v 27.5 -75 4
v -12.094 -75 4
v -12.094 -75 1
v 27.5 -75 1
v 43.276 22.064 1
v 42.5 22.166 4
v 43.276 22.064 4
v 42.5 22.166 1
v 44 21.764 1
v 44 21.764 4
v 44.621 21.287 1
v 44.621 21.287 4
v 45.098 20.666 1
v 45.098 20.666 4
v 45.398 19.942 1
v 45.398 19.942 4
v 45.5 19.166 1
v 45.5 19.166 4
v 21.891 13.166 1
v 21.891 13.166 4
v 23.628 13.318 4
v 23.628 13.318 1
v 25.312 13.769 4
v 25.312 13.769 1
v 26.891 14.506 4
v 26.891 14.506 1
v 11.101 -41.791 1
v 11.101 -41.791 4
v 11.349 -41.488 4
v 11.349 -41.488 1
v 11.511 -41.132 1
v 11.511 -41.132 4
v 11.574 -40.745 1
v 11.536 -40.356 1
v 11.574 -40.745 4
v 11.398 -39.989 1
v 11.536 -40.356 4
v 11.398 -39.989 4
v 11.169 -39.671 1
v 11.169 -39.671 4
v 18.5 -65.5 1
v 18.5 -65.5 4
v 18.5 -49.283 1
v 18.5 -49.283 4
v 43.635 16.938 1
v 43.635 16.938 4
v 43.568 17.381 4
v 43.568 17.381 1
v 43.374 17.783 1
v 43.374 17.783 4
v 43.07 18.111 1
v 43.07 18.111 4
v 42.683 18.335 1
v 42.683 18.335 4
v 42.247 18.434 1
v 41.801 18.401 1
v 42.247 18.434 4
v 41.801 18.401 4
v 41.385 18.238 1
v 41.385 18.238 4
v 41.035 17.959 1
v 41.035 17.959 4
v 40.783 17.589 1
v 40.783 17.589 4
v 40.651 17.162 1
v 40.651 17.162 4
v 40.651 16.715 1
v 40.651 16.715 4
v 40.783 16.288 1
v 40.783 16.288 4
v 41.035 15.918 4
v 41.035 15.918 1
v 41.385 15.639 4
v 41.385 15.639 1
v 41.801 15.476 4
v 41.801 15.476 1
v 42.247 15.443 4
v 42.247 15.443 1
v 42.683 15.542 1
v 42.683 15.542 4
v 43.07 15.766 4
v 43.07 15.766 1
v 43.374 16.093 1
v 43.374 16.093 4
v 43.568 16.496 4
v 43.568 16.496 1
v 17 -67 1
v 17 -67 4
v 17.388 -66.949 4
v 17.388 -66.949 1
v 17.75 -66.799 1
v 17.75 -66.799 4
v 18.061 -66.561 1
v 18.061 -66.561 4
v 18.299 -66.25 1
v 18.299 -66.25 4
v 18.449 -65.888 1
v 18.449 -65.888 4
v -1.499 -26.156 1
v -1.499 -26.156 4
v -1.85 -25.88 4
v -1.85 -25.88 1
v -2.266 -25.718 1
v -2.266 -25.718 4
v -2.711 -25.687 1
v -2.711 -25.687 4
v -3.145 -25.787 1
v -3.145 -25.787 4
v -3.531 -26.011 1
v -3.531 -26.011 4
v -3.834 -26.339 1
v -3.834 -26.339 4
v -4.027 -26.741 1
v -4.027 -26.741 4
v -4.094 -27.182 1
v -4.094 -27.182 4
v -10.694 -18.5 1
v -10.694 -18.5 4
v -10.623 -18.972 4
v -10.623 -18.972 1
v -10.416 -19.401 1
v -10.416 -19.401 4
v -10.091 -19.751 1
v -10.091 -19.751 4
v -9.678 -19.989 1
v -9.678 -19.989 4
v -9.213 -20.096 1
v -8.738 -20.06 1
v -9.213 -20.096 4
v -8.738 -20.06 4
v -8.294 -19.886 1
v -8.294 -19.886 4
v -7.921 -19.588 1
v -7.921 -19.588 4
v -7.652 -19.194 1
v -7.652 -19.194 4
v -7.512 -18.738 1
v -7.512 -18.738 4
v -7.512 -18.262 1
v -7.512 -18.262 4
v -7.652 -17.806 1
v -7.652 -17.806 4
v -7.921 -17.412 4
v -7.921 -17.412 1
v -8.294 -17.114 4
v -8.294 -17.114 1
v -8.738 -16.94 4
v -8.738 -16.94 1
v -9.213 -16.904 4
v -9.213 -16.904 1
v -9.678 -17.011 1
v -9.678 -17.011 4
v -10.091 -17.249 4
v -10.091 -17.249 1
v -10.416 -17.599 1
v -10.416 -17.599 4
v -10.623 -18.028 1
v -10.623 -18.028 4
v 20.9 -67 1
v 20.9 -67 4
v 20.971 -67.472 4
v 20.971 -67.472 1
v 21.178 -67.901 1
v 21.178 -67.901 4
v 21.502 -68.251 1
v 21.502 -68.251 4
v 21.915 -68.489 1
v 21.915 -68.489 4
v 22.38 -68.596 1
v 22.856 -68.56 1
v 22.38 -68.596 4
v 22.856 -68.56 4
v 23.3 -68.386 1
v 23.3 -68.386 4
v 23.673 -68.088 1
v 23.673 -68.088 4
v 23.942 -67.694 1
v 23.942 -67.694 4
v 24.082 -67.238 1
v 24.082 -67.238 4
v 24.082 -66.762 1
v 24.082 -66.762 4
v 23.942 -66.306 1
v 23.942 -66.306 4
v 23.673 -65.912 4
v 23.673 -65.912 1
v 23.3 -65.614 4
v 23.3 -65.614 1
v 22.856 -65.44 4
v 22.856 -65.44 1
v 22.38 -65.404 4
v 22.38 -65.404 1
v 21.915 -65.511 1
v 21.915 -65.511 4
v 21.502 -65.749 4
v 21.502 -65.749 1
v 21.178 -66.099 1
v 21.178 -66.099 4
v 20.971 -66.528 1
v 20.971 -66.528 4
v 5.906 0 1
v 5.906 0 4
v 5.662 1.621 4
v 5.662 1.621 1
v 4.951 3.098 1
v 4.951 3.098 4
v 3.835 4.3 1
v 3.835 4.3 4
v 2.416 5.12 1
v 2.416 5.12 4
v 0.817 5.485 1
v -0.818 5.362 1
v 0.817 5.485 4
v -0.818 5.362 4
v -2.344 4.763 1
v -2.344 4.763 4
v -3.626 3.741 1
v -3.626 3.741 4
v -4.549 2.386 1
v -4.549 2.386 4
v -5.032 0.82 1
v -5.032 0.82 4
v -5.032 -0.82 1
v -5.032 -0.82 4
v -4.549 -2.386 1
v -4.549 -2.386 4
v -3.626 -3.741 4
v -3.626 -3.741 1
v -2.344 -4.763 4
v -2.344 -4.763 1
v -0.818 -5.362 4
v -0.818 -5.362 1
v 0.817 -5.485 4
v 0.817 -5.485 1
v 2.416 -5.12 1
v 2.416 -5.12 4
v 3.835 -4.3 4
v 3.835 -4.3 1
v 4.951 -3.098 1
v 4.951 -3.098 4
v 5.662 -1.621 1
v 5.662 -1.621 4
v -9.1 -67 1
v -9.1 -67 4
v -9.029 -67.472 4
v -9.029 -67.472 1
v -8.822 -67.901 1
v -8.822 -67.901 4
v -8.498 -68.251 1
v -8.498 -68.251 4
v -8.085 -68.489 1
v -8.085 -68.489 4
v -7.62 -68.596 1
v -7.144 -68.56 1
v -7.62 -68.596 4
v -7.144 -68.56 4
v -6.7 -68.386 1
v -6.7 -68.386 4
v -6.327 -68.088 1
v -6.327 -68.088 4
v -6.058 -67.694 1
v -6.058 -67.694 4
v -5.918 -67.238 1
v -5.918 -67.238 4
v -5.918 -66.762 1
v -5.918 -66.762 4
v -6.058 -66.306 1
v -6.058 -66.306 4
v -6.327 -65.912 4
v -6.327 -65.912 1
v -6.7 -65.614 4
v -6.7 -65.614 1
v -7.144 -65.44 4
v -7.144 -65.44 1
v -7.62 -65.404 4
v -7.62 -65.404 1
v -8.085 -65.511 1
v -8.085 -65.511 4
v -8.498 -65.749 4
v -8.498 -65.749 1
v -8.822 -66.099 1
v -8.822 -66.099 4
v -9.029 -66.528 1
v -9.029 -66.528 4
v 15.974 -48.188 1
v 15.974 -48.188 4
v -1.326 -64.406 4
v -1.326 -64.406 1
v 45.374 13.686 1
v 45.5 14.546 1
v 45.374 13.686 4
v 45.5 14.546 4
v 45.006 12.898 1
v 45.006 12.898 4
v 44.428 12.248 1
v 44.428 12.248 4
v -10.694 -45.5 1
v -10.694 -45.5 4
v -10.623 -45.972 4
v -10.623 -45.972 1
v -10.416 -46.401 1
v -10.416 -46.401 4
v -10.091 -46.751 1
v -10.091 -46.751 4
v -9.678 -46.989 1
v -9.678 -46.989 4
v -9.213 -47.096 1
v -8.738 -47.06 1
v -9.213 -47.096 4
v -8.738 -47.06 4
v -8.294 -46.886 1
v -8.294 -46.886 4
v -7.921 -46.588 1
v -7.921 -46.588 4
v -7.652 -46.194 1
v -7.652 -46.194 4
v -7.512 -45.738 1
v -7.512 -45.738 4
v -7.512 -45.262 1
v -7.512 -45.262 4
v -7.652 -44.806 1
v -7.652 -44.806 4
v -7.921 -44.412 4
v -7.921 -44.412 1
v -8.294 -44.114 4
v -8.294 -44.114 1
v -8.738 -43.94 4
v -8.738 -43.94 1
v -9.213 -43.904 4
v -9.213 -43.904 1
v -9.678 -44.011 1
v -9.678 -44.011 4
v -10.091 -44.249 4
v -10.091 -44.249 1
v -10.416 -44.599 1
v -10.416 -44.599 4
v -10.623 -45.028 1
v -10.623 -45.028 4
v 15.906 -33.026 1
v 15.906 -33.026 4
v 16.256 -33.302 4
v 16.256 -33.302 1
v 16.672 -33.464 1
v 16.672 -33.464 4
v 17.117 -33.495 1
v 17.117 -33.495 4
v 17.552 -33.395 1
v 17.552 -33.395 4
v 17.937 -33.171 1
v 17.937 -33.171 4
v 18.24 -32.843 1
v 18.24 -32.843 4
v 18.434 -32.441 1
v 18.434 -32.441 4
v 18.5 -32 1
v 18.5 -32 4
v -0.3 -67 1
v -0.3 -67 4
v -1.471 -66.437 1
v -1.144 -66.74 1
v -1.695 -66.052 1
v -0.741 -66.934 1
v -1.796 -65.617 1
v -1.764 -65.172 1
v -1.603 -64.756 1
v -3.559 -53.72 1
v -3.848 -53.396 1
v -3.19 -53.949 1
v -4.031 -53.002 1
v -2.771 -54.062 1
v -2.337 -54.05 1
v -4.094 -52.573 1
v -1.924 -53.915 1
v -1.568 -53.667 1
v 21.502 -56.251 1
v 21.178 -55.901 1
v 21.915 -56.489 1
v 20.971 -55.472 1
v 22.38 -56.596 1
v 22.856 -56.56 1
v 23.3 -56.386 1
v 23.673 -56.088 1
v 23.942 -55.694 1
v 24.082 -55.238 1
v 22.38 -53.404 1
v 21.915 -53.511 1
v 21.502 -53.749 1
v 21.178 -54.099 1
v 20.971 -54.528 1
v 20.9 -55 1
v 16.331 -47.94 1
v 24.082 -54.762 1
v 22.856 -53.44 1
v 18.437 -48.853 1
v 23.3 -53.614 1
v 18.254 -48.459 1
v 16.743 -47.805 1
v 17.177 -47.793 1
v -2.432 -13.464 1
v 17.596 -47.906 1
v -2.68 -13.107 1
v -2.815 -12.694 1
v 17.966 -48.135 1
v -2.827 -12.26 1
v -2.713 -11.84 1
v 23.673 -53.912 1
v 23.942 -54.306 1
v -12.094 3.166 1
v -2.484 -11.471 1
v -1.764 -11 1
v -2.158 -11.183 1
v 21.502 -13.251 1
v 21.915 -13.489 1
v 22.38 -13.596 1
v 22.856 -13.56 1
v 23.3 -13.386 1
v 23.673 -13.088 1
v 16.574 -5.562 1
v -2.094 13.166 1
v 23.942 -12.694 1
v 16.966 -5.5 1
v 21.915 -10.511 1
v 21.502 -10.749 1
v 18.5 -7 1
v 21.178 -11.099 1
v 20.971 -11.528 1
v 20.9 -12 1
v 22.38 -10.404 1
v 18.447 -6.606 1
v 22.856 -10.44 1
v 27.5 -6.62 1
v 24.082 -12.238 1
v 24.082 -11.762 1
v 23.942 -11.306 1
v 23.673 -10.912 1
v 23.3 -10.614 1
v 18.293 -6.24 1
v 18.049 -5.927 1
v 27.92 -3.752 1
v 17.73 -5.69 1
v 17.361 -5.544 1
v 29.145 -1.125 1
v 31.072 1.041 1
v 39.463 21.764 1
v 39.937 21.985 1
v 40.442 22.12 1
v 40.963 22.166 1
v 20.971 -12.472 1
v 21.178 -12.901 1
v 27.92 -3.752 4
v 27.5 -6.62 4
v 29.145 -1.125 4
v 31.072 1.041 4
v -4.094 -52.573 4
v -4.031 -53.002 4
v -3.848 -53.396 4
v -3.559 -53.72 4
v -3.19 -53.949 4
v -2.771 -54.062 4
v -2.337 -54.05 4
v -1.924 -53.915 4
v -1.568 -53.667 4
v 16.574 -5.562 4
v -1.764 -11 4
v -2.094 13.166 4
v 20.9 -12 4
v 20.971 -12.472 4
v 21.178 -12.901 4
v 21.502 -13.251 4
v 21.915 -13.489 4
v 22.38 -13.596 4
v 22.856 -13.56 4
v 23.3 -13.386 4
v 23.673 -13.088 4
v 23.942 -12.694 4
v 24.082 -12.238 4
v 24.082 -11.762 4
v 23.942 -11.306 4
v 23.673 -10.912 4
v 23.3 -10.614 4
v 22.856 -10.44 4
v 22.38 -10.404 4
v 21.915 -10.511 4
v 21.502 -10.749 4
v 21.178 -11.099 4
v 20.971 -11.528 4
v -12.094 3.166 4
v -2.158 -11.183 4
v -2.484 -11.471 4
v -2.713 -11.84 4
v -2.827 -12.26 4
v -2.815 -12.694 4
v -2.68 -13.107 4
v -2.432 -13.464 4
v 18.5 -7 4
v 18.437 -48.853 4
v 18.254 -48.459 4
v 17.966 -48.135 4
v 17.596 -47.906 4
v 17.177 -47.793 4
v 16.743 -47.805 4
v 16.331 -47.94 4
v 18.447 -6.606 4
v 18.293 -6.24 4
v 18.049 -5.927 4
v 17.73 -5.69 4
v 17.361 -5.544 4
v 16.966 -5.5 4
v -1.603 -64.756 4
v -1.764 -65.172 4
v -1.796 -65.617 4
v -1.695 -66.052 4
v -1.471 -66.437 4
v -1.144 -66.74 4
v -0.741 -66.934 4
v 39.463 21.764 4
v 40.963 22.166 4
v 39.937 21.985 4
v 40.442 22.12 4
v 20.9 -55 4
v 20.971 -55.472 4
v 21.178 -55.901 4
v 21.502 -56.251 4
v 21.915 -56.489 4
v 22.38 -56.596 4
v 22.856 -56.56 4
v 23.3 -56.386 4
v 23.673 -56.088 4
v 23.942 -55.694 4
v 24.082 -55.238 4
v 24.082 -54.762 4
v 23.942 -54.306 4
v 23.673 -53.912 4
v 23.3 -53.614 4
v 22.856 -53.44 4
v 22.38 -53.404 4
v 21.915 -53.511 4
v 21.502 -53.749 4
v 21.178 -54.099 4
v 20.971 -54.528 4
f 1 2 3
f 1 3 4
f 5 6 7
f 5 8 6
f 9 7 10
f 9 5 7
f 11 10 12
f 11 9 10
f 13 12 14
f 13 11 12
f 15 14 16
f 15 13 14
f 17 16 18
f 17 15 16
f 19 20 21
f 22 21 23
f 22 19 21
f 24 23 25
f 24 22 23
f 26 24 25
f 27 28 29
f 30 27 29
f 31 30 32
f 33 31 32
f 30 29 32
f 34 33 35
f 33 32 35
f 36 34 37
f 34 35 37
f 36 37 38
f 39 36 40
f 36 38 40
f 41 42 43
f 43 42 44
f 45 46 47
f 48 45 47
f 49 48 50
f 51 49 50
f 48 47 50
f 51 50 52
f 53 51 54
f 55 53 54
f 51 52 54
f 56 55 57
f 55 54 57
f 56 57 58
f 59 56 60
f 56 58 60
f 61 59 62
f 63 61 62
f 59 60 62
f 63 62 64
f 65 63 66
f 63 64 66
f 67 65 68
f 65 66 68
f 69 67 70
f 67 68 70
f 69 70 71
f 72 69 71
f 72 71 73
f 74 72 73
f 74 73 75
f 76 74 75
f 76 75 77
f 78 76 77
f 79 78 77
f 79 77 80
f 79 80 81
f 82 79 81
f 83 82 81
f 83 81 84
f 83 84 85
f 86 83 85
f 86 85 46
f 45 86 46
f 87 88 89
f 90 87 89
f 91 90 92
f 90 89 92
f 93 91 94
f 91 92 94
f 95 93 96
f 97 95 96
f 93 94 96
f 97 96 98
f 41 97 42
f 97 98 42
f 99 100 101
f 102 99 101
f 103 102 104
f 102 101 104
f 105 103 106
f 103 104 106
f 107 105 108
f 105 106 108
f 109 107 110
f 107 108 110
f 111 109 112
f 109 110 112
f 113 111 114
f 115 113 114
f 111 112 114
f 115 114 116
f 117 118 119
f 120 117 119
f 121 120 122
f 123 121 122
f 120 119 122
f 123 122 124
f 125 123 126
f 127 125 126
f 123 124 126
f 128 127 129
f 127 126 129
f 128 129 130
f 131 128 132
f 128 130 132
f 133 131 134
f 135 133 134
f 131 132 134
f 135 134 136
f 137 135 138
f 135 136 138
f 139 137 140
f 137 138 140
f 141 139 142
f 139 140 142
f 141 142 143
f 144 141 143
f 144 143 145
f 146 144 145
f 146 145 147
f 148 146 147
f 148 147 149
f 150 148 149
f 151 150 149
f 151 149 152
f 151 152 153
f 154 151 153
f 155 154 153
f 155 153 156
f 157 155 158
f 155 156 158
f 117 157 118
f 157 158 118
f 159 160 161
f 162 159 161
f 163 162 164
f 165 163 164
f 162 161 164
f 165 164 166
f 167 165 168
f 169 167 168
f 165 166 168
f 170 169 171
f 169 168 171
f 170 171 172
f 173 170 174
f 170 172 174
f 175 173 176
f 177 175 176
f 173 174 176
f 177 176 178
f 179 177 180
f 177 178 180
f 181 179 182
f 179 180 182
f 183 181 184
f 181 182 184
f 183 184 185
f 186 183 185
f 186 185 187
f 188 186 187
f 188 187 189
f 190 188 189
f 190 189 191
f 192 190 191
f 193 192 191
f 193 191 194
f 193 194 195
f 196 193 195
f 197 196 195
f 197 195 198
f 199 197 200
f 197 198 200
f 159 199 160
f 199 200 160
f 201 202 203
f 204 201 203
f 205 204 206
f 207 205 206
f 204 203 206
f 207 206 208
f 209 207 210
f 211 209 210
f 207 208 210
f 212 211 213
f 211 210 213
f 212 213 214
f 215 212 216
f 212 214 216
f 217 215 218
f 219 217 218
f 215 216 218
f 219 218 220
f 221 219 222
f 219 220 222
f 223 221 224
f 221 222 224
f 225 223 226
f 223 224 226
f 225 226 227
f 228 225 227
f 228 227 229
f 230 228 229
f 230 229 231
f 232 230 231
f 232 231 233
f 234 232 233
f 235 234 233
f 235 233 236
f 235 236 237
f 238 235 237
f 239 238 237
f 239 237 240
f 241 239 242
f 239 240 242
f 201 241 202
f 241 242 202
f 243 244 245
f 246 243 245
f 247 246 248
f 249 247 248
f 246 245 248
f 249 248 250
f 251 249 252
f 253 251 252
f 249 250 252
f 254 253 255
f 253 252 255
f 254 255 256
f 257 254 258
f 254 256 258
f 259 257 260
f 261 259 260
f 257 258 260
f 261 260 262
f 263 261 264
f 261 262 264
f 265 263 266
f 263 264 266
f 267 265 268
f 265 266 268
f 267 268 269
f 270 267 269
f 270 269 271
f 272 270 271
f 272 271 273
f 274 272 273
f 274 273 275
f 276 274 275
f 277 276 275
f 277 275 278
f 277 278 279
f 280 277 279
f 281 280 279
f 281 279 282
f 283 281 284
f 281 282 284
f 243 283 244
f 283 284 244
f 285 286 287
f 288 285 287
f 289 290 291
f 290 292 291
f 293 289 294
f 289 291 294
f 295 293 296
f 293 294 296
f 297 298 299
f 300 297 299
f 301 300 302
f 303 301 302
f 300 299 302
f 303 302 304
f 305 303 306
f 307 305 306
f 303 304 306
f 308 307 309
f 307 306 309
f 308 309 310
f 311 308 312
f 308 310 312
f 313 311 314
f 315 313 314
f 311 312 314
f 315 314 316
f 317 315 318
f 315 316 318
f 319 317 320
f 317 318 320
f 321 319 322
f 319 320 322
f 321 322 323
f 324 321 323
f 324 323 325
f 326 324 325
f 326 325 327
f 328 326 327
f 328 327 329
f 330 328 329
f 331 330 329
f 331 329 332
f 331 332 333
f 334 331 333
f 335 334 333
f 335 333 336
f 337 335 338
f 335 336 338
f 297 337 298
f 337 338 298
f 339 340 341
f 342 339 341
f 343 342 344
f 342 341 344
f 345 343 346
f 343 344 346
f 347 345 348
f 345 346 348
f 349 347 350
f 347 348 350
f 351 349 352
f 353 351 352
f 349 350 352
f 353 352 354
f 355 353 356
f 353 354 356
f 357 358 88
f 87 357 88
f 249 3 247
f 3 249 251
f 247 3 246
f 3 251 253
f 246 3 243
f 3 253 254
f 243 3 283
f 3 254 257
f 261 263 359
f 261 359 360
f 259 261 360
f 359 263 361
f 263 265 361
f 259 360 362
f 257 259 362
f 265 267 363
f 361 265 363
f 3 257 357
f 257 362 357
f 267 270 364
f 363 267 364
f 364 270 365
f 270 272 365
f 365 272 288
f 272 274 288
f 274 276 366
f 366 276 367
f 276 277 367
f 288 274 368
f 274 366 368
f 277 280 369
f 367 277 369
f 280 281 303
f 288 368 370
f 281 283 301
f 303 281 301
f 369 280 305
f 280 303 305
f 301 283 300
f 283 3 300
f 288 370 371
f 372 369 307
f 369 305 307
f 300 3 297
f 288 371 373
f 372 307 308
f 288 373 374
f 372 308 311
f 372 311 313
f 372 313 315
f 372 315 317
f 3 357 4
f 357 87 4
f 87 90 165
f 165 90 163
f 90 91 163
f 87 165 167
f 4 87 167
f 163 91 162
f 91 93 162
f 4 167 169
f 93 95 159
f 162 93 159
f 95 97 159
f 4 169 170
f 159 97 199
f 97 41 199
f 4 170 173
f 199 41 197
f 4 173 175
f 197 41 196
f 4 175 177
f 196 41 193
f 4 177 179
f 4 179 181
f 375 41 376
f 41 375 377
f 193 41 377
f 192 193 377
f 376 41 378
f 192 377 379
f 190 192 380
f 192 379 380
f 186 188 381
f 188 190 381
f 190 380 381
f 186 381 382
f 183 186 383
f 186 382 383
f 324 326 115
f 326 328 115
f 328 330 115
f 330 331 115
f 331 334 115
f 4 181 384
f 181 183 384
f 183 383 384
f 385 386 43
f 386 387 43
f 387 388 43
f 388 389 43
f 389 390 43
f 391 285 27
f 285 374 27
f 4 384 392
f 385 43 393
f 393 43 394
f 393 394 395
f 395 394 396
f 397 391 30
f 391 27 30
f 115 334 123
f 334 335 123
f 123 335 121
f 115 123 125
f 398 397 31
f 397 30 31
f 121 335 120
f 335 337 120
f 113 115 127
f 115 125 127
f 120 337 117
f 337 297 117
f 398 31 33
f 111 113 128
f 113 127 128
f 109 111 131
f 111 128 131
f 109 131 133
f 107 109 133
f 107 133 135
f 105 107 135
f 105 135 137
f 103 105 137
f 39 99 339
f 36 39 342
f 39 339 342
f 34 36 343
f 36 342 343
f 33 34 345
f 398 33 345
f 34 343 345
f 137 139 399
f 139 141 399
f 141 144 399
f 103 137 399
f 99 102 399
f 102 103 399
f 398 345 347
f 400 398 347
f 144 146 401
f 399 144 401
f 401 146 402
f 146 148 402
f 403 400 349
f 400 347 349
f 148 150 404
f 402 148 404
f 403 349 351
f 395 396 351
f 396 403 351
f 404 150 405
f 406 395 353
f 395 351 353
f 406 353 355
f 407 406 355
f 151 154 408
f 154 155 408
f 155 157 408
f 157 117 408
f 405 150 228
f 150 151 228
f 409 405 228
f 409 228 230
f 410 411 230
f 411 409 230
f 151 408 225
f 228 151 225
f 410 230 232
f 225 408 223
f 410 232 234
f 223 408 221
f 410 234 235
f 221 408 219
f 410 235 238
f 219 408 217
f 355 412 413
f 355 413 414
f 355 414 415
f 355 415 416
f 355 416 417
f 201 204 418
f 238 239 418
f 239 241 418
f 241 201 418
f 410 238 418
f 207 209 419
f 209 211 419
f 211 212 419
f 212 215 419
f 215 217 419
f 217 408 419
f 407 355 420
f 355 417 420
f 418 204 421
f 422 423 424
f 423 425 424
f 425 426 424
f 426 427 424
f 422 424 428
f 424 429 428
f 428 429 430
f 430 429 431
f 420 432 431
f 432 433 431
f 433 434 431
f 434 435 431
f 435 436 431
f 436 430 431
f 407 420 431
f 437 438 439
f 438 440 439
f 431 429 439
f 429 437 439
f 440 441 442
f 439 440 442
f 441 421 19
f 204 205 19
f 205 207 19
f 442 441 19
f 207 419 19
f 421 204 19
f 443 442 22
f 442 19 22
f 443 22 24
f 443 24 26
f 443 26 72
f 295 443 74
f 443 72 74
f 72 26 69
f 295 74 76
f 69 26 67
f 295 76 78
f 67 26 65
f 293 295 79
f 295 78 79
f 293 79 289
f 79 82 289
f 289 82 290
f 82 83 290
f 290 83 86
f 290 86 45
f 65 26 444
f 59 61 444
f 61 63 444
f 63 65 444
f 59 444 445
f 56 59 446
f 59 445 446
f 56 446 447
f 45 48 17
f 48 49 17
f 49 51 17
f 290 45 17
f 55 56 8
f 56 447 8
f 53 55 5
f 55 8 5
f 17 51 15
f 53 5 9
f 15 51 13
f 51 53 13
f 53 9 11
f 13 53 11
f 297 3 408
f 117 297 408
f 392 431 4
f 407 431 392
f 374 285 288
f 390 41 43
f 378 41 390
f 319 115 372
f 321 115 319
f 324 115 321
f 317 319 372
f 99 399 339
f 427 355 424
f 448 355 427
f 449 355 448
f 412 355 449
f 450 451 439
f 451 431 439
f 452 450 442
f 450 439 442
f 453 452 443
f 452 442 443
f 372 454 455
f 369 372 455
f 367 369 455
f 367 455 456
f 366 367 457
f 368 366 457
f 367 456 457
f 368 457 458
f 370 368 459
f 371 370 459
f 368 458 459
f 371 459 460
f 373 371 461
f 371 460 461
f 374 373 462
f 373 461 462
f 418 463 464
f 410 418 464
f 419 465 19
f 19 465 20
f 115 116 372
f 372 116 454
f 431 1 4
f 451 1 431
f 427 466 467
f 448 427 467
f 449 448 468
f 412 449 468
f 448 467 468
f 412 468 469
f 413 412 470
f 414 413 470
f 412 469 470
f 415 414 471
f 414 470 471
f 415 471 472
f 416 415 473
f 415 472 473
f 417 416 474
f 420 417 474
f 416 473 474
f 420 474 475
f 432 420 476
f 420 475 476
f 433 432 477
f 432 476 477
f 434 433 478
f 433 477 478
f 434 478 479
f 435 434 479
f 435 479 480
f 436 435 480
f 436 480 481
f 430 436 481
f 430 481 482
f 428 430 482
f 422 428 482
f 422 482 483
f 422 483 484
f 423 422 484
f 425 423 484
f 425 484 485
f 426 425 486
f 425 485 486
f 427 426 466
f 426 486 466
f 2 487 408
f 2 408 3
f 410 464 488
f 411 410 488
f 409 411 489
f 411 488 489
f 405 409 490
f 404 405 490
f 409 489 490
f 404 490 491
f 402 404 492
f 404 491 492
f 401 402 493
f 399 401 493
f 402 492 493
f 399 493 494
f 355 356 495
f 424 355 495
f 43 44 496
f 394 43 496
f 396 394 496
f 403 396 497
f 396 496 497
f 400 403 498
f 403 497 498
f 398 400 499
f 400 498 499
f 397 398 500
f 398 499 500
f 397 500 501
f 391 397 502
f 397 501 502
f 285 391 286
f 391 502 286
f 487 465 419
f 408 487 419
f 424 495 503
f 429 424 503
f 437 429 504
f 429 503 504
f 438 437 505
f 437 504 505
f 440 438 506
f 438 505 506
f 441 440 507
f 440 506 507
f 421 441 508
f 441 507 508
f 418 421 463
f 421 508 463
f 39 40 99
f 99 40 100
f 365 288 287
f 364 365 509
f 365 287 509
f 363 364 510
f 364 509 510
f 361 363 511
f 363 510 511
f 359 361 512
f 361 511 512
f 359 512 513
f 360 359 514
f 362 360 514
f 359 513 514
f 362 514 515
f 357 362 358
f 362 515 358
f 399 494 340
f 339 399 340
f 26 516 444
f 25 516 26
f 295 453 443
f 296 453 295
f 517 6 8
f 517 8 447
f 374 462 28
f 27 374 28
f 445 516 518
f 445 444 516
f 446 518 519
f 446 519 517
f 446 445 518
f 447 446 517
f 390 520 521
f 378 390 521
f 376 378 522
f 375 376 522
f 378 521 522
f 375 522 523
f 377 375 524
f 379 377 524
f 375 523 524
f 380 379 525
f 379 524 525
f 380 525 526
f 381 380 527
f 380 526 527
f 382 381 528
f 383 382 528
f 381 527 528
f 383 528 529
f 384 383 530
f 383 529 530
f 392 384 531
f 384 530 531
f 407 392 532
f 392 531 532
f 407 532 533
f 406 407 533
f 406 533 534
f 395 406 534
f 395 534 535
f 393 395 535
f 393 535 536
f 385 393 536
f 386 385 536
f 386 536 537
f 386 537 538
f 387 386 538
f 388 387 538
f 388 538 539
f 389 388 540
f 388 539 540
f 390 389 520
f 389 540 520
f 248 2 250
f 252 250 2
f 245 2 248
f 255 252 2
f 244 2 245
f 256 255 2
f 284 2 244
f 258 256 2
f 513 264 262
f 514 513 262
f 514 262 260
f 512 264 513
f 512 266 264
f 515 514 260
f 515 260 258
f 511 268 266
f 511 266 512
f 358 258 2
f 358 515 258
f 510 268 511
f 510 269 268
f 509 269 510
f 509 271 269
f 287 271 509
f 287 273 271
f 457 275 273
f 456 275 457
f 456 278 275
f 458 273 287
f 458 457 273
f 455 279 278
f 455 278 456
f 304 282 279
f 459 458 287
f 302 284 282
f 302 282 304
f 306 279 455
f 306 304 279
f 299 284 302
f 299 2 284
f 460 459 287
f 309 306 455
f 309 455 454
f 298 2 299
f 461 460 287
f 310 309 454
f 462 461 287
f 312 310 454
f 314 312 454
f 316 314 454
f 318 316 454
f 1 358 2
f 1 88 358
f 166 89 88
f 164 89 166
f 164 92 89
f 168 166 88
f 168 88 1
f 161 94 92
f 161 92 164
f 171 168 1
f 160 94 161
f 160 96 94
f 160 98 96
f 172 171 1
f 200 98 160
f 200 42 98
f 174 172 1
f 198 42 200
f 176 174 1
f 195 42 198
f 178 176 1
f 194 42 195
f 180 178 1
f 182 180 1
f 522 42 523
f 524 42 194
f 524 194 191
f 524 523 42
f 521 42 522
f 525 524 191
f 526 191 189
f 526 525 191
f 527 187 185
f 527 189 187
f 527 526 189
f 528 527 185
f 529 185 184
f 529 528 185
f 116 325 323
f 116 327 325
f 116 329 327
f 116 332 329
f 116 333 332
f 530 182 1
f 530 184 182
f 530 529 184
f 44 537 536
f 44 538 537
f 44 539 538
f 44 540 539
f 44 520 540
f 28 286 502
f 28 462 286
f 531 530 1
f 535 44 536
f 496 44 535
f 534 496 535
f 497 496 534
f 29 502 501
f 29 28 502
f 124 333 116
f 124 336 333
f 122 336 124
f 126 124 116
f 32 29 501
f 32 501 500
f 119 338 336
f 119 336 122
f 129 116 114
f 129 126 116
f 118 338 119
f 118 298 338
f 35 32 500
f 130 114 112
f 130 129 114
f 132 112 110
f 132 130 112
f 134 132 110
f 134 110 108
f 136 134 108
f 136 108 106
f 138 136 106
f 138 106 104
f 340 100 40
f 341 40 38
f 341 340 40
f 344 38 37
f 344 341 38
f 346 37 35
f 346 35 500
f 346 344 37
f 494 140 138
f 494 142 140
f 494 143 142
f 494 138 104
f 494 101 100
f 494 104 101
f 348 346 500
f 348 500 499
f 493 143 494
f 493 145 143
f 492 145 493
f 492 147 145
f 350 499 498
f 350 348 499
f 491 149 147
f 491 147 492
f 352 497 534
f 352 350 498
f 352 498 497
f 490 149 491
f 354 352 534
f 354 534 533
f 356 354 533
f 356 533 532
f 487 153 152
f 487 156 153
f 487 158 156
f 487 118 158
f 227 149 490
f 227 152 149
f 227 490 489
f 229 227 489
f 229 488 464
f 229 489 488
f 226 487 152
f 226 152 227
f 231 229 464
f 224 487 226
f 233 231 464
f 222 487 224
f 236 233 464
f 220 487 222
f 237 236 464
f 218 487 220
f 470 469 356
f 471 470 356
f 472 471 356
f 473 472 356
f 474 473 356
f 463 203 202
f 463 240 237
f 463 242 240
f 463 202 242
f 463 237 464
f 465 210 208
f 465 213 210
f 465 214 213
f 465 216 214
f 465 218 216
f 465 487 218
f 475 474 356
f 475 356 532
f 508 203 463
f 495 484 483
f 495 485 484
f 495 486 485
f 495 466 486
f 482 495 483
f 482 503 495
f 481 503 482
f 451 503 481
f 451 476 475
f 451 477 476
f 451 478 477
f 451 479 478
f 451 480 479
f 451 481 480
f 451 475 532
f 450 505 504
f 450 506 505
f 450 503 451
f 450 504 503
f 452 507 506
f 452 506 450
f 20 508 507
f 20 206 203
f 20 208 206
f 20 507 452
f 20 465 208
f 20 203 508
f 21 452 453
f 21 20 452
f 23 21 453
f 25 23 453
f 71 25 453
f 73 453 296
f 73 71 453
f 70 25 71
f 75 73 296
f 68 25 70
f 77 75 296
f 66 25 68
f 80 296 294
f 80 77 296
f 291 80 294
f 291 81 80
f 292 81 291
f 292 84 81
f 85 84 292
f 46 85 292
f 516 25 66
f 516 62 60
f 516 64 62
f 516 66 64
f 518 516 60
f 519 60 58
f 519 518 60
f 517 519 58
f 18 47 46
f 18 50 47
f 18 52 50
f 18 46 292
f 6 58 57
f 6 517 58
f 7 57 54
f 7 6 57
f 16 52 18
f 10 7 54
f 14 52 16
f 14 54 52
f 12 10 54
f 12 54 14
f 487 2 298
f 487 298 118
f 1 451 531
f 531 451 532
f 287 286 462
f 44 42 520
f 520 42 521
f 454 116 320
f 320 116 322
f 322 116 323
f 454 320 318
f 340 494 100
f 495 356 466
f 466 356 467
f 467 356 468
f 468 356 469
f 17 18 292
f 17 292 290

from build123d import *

# Parameters (mm, degrees)
SKETCH_1_R          = 1.6
SKETCH_1_R_2        = 6.075
EXTRUDE_1_DEPTH     = 3
SKETCH_6_R          = 6.075
SKETCH_6_R_2        = 5.5
EXTRUDE_3_DEPTH     = 3
CUT_EXTRUDE_3_DEPTH = 10
EXTRUDE_4_DEPTH     = 3
CUT_EXTRUDE_4_DEPTH = 10
EXTRUDE_5_DEPTH     = 3
SKETCH_11_R         = 1.5
CUT_EXTRUDE_5_DEPTH = 10
SKETCH1_W           = 13.017216885
SKETCH1_H           = 13.916417238
CUT_EXTRUDE1_DEPTH  = 2
CHAMFER1_SIZE       = 10
FILLET1_R           = 10
FILLET2_R           = 3


with BuildPart() as part:
    # 草图1 → 凸台-拉伸1 (new body)
    with BuildSketch(Plane.XY.offset(4)):
        Polygon((27.5, -75), (27.5, -38.070079149), (27.5, 15), (-12.093715748, 15), (-12.093715748, -75), align=None)
        with Locations(Location((22.5, -12, 0), (0, 0, 180))):
            Circle(SKETCH_1_R, mode=Mode.SUBTRACT)
        with Locations(Location((22.5, -55, 0), (0, 0, 180))):
            Circle(SKETCH_1_R, mode=Mode.SUBTRACT)
        with Locations(Location((22.5, -67, 0), (0, 0, 180))):
            Circle(SKETCH_1_R, mode=Mode.SUBTRACT)
        with Locations(Location((-7.5, -67, 0), (0, 0, 180))):
            Circle(SKETCH_1_R, mode=Mode.SUBTRACT)
        with Locations(Location((-9.093715748, -18.5, 0), (0, 0, 180))):
            Circle(SKETCH_1_R, mode=Mode.SUBTRACT)
        with Locations(Location((0.406284252, 0, 0), (0, 0, 180))):
            Circle(SKETCH_1_R_2, mode=Mode.SUBTRACT)
        with Locations(Location((-9.093715748, -45.5, 0), (0, 0, 180))):
            Circle(SKETCH_1_R, mode=Mode.SUBTRACT)
    extrude(amount=-EXTRUDE_1_DEPTH)

    # 草图6 → 凸台-拉伸3 (add)
    with BuildSketch(Plane.XY.offset(4)):
        with Locations((0.406284252, 0)):
            Circle(SKETCH_6_R)
        with Locations((0.406284252, 0)):
            Circle(SKETCH_6_R_2, mode=Mode.SUBTRACT)
    extrude(amount=-EXTRUDE_3_DEPTH)

    # 草图7 → 切除-拉伸3 (cut)
    with BuildSketch(Plane.XY.offset(4)):
        with BuildLine():
            Line((16.573520953, -5.561905559), (-1.763823971, -11))
            ThreePointArc((-1.763823971, -11), (-2.785101184, -12.045663796), (-2.431704924, -13.463948325))
            Line((-2.431704924, -13.463948325), (15.90564, -33.025853884))
            ThreePointArc((15.90564, -33.025853884), (17.551570485, -33.394908599), (18.5, -32))
            Line((18.5, -32), (18.5, -7))
            ThreePointArc((18.5, -7), (17.897296336, -5.797977003), (16.573520953, -5.561905559))
        make_face()
        with BuildLine():
            Line((-4.093715748, -27.181985619), (-4.093715748, -52.572589617))
            ThreePointArc((-4.093715748, -52.572589617), (-3.190045848, -53.948958177), (-1.567861865, -53.666949617))
            Line((-1.567861865, -53.666949617), (11.100960059, -41.791186455))
            ThreePointArc((11.100960059, -41.791186455), (11.57432379, -40.745267595), (11.169466175, -39.670972572))
            Line((11.169466175, -39.670972572), (-1.499355748, -26.156131735))
            ThreePointArc((-1.499355748, -26.156131735), (-3.145286233, -25.78707702), (-4.093715748, -27.181985619))
        make_face()
        with BuildLine():
            Line((15.974146116, -48.188371256), (-1.326105415, -64.40564))
            ThreePointArc((-1.326105415, -64.40564), (-1.69516013, -66.051570485), (-0.300251531, -67))
            Line((-0.300251531, -67), (17, -67))
            ThreePointArc((17, -67), (18.060660172, -66.560660172), (18.5, -65.5))
            Line((18.5, -65.5), (18.5, -49.282731256))
            ThreePointArc((18.5, -49.282731256), (17.596330099, -47.906362696), (15.974146116, -48.188371256))
        make_face()
    extrude(amount=-CUT_EXTRUDE_3_DEPTH, mode=Mode.SUBTRACT)

    # 草图8 → 凸台-拉伸4 (add)
    with BuildSketch(Plane.XY.offset(4)):
        Polygon((-12.093715748, 15), (15.09823702, 15), (27.5, 15), (27.5, 35), (15.09823702, 35), (-12.093715748, 35), align=None)
    extrude(amount=-EXTRUDE_4_DEPTH)

    # 草图9 → 切除-拉伸4 (cut)
    with BuildSketch(Plane.XY.offset(4)):
        Polygon((27.5, 13.166002361), (27.5, 35), (9.950271794, 35), (-3.087828752, 35), (-12.093715748, 35), (-12.093715748, 24.5099793), (-12.093715748, 13.166002361), align=None)
    extrude(amount=-CUT_EXTRUDE_4_DEPTH, mode=Mode.SUBTRACT)

    # 草图10 → 凸台-拉伸5 (add)
    with BuildSketch(Plane.XY.offset(4)):
        Polygon((27.5, 13.166002361), (27.5, 2.997829135), (27.5, -1.956571947), (47.5, 14.825420677), (47.5, 22.166002361), (40.159418315, 22.166002361), (24.570961047, 13.166002361), align=None)
    extrude(amount=-EXTRUDE_5_DEPTH)

    # 草图11 → 切除-拉伸5 (cut)
    with BuildSketch(Plane.XY.offset(4)):
        with Locations((42.134580189, 16.938478334)):
            Circle(SKETCH_11_R)
    extrude(amount=-CUT_EXTRUDE_5_DEPTH, mode=Mode.SUBTRACT)

    # Sketch1 → Cut-Extrude1 (cut)
    with BuildSketch(Plane(origin=(47.5, 0, 0), x_dir=(0, 0, -1), z_dir=(1, 0, 0))):
        with Locations((-1.715406072, 17.791444366)):
            Rectangle(SKETCH1_W, SKETCH1_H)
    extrude(amount=-CUT_EXTRUDE1_DEPTH, mode=Mode.SUBTRACT)

    # Chamfer1
    chamfer1_edges = [part.edges().sort_by_distance(p)[0] for p in [
        (-12.093715748, 13.166002361, 2.5),
    ]]
    chamfer(chamfer1_edges, length=CHAMFER1_SIZE)

    # Fillet1
    fillet1_edges = [part.edges().sort_by_distance(p)[0] for p in [
        (27.5, -1.956571947, 2.5),
        (24.570961047, 13.166002361, 2.5),
    ]]
    fillet(fillet1_edges, radius=FILLET1_R)

    # Fillet2
    fillet2_edges = [part.edges().sort_by_distance(p)[0] for p in [
        (40.159418315, 22.166002361, 2.5),
        (45.5, 13.147221414, 2.5),
        (45.5, 22.166002361, 2.5),
    ]]
    fillet(fillet2_edges, radius=FILLET2_R)


solid = part.part
